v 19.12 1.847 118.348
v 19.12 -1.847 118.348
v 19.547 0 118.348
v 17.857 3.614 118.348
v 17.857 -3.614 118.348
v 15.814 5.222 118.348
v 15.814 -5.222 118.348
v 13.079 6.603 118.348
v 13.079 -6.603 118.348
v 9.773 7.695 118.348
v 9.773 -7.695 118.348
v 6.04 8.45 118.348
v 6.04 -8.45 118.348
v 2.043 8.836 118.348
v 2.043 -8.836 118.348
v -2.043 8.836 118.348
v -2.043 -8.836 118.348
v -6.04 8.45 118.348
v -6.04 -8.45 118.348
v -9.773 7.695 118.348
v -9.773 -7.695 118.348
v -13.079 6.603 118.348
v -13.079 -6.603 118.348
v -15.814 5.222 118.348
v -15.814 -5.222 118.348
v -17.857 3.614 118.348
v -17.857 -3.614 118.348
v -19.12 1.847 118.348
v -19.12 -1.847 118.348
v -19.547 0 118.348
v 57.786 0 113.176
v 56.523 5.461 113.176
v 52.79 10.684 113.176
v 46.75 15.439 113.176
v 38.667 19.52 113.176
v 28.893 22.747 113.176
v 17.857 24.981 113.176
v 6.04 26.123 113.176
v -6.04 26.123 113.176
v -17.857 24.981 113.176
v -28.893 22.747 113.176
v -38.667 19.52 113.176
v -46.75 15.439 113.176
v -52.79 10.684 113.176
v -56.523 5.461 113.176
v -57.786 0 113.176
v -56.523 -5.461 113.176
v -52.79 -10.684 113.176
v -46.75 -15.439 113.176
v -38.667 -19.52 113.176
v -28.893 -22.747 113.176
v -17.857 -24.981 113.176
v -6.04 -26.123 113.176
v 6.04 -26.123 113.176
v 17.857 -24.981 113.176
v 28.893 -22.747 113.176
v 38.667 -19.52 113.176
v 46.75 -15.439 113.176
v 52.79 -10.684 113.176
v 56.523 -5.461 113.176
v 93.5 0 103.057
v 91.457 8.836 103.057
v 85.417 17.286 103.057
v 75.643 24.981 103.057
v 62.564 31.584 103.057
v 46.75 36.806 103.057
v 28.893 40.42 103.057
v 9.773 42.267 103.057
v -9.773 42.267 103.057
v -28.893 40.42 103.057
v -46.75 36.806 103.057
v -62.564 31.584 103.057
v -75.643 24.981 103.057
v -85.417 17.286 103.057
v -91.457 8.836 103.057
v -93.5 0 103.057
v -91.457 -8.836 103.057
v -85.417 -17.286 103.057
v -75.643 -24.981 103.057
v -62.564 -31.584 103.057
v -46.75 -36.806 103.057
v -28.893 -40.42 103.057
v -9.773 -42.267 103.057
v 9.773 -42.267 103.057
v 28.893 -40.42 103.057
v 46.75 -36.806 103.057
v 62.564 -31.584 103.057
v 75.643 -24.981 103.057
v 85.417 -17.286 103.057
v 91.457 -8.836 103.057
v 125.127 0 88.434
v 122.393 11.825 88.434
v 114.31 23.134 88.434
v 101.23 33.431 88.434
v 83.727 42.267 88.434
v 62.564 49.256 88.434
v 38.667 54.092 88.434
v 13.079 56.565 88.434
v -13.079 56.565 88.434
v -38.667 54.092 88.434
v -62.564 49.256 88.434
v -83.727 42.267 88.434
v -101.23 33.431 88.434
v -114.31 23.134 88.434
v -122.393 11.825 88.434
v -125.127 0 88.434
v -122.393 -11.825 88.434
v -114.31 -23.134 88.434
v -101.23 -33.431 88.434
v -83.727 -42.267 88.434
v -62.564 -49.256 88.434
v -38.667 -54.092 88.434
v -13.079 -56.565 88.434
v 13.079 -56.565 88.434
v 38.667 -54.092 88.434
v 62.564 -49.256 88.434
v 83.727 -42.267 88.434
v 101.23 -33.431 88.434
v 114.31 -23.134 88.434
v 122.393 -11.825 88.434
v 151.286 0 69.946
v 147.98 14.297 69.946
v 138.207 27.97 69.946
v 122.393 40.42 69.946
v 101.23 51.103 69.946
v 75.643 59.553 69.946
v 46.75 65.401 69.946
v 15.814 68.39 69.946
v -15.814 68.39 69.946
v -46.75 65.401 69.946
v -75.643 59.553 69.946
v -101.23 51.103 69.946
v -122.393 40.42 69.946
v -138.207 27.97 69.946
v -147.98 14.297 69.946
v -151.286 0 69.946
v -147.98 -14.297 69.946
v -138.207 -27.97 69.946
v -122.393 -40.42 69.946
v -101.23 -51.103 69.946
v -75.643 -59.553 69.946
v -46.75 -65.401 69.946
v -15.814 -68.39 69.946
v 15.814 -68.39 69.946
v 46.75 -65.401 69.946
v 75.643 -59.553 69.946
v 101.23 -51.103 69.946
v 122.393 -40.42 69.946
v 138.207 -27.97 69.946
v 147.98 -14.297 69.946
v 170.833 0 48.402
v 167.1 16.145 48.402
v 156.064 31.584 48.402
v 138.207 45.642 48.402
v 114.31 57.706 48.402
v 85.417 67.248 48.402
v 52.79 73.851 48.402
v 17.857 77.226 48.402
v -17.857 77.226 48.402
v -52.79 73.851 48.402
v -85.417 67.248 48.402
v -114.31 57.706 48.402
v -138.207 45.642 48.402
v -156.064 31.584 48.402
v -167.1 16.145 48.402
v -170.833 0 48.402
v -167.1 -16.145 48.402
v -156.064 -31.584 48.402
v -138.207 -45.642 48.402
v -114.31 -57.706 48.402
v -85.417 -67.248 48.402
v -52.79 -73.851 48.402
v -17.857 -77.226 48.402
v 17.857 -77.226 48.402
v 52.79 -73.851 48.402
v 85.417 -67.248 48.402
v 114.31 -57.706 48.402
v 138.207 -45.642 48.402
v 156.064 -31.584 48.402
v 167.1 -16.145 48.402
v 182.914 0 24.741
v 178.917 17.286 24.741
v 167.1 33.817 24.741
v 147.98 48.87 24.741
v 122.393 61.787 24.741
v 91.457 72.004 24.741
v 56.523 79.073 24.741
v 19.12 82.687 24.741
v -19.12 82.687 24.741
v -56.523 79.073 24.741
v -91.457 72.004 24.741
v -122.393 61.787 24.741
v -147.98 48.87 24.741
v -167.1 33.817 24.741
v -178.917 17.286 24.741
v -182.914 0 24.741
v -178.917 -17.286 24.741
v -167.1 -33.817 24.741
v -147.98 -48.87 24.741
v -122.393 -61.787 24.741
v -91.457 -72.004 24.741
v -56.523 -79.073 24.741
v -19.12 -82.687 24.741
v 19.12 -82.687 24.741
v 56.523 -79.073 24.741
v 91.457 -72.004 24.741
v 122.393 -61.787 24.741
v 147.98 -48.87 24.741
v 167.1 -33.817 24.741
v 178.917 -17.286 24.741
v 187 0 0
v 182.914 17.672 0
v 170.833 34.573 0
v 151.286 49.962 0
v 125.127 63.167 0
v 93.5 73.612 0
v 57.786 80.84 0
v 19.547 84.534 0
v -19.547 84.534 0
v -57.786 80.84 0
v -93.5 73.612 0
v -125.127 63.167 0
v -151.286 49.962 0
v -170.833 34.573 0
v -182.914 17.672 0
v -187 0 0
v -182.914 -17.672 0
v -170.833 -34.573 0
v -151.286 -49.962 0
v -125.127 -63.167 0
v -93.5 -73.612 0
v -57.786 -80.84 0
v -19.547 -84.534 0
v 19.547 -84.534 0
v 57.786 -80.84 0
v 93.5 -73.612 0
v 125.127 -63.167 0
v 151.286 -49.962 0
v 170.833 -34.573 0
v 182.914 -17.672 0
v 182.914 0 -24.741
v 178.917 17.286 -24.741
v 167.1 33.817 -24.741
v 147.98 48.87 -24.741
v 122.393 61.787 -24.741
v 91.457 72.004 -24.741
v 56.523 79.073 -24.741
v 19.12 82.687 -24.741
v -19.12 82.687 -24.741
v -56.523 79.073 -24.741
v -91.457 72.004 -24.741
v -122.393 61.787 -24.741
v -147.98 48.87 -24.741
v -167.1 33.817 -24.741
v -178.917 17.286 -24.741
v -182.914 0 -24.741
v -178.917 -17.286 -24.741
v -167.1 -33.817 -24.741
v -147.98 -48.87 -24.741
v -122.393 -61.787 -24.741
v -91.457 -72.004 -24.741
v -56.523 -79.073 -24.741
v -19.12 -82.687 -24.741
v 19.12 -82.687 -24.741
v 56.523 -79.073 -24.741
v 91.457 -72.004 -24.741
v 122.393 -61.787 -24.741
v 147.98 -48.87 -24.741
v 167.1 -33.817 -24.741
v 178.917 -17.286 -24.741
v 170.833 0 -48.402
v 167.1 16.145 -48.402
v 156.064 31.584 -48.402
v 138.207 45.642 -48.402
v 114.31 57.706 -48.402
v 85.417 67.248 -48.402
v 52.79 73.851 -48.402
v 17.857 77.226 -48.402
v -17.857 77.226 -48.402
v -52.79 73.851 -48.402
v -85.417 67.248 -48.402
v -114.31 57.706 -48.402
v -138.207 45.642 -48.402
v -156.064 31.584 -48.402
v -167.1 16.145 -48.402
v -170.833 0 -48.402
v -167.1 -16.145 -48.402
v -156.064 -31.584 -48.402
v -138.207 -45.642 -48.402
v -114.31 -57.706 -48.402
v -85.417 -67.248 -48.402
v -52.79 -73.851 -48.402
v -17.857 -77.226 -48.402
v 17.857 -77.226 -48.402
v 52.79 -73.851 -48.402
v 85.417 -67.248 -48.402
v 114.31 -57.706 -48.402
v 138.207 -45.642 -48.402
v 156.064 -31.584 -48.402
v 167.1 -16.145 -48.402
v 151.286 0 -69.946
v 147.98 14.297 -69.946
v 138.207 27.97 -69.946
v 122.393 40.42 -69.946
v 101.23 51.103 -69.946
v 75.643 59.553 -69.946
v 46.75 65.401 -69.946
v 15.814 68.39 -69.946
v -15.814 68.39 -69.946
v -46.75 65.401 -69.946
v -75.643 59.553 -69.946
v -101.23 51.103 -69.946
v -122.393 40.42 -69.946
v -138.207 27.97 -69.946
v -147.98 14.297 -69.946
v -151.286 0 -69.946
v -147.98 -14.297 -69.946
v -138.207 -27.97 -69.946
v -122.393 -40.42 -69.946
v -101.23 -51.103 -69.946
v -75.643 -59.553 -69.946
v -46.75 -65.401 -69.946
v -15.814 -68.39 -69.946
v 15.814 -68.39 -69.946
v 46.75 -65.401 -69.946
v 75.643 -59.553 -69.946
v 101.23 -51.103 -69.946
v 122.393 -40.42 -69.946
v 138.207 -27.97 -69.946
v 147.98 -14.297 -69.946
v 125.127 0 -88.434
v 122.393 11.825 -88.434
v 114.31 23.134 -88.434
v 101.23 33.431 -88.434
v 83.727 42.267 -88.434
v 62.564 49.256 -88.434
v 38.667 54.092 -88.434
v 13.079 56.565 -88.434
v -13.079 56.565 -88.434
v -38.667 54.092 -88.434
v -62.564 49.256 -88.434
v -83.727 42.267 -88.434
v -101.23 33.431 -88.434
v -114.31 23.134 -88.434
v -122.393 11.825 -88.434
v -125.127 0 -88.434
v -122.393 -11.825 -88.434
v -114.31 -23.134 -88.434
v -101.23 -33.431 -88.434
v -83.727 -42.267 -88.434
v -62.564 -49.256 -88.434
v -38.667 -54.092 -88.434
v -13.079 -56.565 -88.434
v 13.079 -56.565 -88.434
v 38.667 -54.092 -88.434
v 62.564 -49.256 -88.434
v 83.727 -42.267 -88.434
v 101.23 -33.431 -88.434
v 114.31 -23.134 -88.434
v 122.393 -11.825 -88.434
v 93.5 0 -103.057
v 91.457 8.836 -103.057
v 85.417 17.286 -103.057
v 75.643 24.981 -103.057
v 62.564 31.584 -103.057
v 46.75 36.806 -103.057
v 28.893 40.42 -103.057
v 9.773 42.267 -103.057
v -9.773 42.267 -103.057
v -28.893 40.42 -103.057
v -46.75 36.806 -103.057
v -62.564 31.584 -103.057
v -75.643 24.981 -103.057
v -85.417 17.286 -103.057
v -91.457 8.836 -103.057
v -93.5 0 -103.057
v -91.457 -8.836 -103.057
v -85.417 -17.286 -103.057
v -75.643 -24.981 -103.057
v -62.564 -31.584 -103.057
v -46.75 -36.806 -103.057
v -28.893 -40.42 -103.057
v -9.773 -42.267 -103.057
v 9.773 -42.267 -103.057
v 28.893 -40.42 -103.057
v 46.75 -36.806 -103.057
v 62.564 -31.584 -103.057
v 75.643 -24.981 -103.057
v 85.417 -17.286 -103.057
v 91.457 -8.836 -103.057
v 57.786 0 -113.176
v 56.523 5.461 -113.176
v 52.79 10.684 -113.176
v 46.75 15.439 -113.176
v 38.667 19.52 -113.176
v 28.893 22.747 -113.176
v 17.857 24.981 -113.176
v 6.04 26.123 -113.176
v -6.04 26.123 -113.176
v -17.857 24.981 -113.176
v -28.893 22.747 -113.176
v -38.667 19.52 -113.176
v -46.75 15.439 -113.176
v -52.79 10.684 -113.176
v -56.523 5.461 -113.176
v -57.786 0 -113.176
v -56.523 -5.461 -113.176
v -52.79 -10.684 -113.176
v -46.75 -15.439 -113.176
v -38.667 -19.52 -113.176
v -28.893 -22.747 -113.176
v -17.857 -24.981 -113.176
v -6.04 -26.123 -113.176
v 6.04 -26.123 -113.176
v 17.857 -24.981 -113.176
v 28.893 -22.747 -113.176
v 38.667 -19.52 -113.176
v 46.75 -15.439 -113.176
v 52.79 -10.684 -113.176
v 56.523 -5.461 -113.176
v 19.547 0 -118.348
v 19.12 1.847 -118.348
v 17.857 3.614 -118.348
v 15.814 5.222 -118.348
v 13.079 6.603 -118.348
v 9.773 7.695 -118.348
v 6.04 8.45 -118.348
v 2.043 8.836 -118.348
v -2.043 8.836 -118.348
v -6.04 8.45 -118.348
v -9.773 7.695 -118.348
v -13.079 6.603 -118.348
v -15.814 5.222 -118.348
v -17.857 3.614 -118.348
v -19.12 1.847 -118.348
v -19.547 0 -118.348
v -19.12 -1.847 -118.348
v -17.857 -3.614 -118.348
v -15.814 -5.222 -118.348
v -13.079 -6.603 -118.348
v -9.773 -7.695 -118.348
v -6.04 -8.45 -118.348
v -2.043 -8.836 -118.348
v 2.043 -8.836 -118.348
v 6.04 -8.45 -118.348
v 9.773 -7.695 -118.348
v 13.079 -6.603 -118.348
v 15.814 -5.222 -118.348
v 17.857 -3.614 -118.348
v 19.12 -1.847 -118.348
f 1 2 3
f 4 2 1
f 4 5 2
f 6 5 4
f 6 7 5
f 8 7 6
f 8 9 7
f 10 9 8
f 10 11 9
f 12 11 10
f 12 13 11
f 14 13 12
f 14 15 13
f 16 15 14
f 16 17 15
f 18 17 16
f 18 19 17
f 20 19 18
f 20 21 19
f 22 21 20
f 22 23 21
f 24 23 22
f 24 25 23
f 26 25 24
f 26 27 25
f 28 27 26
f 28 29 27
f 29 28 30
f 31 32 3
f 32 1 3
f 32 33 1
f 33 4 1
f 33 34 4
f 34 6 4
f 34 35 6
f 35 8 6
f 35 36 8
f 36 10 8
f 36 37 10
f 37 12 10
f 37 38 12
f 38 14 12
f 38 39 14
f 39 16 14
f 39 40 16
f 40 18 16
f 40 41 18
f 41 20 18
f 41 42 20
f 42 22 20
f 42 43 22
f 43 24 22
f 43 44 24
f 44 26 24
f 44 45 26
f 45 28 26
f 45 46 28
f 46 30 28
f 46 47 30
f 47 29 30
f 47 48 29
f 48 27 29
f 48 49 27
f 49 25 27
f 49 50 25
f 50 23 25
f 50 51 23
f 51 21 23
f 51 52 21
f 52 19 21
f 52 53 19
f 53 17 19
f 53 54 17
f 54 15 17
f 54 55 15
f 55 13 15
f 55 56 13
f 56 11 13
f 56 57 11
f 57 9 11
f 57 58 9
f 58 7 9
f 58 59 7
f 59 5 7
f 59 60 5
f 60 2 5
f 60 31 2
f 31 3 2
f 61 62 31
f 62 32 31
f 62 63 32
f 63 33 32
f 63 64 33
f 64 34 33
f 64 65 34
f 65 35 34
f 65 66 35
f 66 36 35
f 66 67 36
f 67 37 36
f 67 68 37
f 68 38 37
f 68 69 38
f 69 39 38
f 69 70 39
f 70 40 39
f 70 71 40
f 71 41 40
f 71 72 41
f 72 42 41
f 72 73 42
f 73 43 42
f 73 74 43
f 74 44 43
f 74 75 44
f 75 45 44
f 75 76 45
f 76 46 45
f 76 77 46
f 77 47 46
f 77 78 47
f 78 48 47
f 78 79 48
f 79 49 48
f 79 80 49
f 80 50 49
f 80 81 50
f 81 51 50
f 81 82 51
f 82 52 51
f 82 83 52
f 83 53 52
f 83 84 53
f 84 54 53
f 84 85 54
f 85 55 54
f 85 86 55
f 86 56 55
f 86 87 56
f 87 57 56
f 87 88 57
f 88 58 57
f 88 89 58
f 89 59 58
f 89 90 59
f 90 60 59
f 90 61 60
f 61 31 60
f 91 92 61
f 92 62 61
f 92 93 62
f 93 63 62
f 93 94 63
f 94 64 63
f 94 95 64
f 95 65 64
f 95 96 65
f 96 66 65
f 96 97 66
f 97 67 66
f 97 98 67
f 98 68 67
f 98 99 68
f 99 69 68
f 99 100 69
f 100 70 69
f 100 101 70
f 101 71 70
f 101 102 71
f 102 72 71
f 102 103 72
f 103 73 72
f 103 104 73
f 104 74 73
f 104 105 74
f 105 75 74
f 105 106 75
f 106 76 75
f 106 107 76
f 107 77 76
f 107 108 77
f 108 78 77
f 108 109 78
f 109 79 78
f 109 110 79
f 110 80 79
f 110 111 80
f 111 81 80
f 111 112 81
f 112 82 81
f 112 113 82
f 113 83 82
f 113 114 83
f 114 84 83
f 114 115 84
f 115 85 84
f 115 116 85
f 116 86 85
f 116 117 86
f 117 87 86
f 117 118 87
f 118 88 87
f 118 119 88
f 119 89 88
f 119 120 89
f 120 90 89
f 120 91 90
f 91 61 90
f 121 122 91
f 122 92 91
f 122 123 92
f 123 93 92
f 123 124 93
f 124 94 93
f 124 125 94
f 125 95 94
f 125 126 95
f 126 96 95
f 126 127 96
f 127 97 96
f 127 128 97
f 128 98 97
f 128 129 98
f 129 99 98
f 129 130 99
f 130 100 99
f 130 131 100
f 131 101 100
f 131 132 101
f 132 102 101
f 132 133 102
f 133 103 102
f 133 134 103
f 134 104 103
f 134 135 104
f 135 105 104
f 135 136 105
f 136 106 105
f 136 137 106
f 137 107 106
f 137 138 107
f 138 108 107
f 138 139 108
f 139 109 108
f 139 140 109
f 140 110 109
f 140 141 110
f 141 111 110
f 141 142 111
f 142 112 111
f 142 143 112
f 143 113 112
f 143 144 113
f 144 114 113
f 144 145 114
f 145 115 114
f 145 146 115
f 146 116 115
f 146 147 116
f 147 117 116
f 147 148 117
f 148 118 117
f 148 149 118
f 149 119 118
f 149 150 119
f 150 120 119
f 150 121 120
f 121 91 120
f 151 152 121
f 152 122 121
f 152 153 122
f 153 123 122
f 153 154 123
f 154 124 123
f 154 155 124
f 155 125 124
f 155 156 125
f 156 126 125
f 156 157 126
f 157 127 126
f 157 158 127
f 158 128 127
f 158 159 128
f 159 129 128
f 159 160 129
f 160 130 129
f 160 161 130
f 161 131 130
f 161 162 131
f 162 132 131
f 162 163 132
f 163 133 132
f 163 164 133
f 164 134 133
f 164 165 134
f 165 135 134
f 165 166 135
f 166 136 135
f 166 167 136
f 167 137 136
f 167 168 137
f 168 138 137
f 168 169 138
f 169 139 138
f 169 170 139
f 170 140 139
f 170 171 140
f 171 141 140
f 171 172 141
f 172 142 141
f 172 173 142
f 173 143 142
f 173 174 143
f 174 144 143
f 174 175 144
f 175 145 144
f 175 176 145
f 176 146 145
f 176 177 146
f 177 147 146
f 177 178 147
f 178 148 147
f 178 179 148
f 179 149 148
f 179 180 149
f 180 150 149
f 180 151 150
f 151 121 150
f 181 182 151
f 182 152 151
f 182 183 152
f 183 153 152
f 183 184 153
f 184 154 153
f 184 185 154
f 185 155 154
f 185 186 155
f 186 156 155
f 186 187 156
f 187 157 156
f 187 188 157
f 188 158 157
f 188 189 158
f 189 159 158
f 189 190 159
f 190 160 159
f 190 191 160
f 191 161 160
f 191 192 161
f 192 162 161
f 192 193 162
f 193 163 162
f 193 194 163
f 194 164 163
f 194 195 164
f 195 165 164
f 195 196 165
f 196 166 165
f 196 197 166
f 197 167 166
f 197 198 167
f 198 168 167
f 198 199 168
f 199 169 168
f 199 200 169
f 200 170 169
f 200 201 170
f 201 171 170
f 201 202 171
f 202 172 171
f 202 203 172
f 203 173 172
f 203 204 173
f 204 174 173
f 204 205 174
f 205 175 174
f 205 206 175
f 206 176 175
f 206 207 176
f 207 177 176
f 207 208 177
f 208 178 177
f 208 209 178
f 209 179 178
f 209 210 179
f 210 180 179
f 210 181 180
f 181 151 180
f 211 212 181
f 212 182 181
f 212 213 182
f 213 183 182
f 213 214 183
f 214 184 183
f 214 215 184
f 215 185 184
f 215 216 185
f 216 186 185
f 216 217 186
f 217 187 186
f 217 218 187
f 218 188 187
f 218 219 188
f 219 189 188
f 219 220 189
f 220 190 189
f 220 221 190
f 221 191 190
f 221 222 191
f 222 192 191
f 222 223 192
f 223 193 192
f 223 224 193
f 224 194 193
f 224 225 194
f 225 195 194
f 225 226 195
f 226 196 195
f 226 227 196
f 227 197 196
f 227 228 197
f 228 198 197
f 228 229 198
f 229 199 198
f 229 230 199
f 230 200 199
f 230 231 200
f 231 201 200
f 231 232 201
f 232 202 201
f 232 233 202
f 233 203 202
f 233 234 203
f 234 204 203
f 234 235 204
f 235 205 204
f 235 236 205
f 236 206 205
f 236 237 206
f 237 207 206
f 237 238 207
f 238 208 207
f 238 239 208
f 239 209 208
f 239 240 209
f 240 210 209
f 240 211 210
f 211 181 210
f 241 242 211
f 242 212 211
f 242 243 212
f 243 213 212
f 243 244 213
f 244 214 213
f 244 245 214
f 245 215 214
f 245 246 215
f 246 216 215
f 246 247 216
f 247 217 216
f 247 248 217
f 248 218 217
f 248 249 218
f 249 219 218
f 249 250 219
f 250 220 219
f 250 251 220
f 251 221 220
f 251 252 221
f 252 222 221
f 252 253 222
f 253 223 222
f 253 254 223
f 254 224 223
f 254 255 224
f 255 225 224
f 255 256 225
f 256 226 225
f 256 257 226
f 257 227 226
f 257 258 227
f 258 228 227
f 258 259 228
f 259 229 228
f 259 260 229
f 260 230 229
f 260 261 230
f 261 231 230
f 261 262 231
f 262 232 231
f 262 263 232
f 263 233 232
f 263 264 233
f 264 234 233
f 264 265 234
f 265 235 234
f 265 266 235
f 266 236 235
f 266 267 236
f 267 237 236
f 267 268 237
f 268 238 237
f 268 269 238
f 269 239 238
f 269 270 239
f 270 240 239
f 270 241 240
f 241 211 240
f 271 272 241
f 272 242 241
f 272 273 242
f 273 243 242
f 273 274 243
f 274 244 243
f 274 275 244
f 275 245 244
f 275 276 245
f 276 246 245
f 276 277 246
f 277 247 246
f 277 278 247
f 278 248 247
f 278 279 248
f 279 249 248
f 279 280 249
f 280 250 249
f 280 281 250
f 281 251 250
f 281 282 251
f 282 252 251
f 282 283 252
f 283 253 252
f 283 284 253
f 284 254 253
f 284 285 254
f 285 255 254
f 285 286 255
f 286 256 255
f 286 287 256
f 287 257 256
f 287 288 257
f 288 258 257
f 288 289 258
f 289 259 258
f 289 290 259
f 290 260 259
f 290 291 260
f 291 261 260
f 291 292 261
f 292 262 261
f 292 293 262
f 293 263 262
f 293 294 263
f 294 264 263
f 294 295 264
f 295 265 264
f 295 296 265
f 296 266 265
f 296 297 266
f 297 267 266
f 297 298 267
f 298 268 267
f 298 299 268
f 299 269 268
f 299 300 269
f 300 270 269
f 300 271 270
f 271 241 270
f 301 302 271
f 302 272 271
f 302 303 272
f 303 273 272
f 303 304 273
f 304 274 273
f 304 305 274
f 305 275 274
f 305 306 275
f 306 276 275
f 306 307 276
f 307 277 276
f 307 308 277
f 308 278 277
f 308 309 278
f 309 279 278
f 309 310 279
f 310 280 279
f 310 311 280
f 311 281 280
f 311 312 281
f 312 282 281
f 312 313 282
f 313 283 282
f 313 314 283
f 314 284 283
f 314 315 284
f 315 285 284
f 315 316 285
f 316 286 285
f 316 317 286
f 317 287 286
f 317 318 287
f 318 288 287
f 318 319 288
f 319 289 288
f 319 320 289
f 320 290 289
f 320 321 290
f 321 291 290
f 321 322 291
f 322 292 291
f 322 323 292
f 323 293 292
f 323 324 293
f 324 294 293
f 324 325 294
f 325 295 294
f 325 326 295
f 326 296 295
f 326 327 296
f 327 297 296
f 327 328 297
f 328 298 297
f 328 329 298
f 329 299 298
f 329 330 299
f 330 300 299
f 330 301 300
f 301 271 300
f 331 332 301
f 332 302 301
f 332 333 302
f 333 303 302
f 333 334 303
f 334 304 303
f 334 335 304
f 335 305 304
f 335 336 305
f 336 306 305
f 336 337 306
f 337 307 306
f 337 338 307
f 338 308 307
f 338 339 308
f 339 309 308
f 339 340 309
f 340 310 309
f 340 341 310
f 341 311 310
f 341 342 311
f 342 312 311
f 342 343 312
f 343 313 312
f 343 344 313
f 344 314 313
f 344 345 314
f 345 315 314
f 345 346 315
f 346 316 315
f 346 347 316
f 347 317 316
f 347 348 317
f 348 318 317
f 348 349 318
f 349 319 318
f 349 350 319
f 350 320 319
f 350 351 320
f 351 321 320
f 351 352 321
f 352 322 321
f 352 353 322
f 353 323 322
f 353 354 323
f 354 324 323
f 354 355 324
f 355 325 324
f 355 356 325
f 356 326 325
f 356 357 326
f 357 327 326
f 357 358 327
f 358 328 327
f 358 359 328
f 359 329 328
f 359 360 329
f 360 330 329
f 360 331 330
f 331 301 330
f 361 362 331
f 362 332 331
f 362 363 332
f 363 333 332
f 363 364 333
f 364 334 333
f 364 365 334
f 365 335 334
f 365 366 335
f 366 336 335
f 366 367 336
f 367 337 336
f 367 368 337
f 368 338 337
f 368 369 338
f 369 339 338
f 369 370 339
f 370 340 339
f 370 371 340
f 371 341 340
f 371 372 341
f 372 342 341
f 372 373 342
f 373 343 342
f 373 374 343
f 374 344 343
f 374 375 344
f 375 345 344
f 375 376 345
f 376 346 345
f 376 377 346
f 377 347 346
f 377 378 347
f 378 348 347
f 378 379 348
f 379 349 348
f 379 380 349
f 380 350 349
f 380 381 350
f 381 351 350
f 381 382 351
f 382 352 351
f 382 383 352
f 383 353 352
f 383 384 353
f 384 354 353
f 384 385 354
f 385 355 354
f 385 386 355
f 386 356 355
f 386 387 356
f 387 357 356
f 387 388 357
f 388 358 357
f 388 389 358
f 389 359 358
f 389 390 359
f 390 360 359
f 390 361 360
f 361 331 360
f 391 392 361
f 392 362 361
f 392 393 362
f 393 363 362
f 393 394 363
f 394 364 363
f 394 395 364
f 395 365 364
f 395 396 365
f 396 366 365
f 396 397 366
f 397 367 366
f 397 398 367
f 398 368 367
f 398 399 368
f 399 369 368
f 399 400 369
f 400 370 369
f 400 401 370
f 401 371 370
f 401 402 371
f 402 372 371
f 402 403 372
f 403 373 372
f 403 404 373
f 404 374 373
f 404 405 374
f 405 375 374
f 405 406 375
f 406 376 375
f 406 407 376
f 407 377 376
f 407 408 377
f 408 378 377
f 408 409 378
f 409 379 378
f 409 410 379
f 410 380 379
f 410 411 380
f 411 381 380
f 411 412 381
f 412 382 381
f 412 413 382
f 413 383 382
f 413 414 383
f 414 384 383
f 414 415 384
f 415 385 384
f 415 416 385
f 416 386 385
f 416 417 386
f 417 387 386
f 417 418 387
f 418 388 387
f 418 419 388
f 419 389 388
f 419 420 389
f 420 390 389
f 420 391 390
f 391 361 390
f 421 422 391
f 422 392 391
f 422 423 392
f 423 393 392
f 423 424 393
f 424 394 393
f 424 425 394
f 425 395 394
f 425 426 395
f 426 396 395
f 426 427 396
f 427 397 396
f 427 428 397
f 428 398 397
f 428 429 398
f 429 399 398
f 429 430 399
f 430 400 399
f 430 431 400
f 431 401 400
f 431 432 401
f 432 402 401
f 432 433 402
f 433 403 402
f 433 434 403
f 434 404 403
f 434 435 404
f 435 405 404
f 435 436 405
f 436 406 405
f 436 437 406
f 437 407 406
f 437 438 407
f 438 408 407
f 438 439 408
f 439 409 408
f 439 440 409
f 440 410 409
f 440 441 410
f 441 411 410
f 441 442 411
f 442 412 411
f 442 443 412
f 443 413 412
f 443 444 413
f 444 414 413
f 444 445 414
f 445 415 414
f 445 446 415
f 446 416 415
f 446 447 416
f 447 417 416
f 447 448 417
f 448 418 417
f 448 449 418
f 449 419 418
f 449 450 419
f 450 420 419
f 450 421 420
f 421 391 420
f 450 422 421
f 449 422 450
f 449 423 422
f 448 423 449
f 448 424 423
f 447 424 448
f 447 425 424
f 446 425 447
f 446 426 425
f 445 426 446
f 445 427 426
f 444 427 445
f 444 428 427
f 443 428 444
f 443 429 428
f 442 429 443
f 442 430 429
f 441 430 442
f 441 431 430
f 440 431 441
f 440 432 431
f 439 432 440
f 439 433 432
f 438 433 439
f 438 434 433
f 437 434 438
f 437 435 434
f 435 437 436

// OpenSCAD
// Generated by SolidPython 1.0.1 on 2020-07-29 00:46:49


scale(v = [11, 5, 7]) {
	sphere(r = 17);
}
/***********************************************
*********      SolidPython code:      **********
************************************************
 
# import packages: SolidPython
from solid import *
from solid.utils import *
from itertools import chain, combinations, permutations


class Resize:

    def __init__(self, scad_file):
        self.scad_file = scad_file
        #self.scad_file = import_scad(scad_file)
        # cone/cylinder param:
        self.r1 = 0
        self.r2 = 0
        self.h = 0
        # rectangular prism param:
        self.w = 0
        self.l = 0
        # ellipse param:
        self.r = 0

    # import OpenScad code (file name corresponds to shape)


    # classify shape + parameters
    def assign(self, param1, param2, param3):
        if self.scad_file == 'cone.scad':
            self.r1 = param1
            self.r2 = param2
            self.h = param3
        elif self.scad_file == 'cylinder.scad':
            self.r1 = param1
            self.r2 = param2
            self.h = param3
        elif self.scad_file == 'rectangularPrism.scad':
            self.h = param1
            self.l = param2
            self.w = param3
        else:
            self.r = param1
            self.h = param2

    # resize parameters
    def iterate(self):
        x = range(3, 20, 2)
        i = 1
        if self.scad_file == 'cone.scad':
            tempList = list(permutations(x, 2))
            for temp in tempList:
                param1 = temp[0]
                param2 = temp[1]
                filepath = 'produced_scad_files/' + 'cone' + str(param1) + '_' + str(param2) + '_' + '.scad'
                scad_render_to_file(cylinder(h=param1, r1=param2, r2=0), filepath)

        elif self.scad_file == 'cylinder.scad':
            tempList = list(permutations(x, 3))
            for temp in tempList:
                param1 = temp[0]
                param2 = temp[1]
                filepath = 'produced_scad_files/' + 'cylinder' + str(param1) + '_' + str(param2) + '_' + '.scad'
                scad_render_to_file(cylinder(h=param1, r1=param2, r2=param2), filepath)

        elif self.scad_file == 'rectangularPrism.scad':
            tempList = list(permutations(x, 3))
            for temp in tempList:
                param1 = temp[0]
                param2 = temp[1]
                param3 = temp[2]
                filepath = 'produced_scad_files/' + 'rectangularPrism' + str(param1) + '_' + str(param2) + '_' + str(
                    param3) + '.scad'
                scad_render_to_file(cube(size=(param1, param2, param3)), filepath)

        elif self.scad_file == 'ellipse.scad':
            tempList = list(permutations(x, 4))
            for temp in tempList:
                param1 = temp[0]
                param2 = temp[1]
                param3 = temp[2]
                param4 = temp[3]
                filepath = 'produced_scad_files/' + 'ellipse' + str(param1) + '_' + str(param2) + '_' + str(param3) + '_' + str(param4) + '.scad'
                scad_render_to_file(scale([param1, param2, param3])(sphere(r=param4)), filepath)

    def render_to_scadfile(self):
        scad_render_to_file(scad, 'example.scad') 
 
************************************************/
